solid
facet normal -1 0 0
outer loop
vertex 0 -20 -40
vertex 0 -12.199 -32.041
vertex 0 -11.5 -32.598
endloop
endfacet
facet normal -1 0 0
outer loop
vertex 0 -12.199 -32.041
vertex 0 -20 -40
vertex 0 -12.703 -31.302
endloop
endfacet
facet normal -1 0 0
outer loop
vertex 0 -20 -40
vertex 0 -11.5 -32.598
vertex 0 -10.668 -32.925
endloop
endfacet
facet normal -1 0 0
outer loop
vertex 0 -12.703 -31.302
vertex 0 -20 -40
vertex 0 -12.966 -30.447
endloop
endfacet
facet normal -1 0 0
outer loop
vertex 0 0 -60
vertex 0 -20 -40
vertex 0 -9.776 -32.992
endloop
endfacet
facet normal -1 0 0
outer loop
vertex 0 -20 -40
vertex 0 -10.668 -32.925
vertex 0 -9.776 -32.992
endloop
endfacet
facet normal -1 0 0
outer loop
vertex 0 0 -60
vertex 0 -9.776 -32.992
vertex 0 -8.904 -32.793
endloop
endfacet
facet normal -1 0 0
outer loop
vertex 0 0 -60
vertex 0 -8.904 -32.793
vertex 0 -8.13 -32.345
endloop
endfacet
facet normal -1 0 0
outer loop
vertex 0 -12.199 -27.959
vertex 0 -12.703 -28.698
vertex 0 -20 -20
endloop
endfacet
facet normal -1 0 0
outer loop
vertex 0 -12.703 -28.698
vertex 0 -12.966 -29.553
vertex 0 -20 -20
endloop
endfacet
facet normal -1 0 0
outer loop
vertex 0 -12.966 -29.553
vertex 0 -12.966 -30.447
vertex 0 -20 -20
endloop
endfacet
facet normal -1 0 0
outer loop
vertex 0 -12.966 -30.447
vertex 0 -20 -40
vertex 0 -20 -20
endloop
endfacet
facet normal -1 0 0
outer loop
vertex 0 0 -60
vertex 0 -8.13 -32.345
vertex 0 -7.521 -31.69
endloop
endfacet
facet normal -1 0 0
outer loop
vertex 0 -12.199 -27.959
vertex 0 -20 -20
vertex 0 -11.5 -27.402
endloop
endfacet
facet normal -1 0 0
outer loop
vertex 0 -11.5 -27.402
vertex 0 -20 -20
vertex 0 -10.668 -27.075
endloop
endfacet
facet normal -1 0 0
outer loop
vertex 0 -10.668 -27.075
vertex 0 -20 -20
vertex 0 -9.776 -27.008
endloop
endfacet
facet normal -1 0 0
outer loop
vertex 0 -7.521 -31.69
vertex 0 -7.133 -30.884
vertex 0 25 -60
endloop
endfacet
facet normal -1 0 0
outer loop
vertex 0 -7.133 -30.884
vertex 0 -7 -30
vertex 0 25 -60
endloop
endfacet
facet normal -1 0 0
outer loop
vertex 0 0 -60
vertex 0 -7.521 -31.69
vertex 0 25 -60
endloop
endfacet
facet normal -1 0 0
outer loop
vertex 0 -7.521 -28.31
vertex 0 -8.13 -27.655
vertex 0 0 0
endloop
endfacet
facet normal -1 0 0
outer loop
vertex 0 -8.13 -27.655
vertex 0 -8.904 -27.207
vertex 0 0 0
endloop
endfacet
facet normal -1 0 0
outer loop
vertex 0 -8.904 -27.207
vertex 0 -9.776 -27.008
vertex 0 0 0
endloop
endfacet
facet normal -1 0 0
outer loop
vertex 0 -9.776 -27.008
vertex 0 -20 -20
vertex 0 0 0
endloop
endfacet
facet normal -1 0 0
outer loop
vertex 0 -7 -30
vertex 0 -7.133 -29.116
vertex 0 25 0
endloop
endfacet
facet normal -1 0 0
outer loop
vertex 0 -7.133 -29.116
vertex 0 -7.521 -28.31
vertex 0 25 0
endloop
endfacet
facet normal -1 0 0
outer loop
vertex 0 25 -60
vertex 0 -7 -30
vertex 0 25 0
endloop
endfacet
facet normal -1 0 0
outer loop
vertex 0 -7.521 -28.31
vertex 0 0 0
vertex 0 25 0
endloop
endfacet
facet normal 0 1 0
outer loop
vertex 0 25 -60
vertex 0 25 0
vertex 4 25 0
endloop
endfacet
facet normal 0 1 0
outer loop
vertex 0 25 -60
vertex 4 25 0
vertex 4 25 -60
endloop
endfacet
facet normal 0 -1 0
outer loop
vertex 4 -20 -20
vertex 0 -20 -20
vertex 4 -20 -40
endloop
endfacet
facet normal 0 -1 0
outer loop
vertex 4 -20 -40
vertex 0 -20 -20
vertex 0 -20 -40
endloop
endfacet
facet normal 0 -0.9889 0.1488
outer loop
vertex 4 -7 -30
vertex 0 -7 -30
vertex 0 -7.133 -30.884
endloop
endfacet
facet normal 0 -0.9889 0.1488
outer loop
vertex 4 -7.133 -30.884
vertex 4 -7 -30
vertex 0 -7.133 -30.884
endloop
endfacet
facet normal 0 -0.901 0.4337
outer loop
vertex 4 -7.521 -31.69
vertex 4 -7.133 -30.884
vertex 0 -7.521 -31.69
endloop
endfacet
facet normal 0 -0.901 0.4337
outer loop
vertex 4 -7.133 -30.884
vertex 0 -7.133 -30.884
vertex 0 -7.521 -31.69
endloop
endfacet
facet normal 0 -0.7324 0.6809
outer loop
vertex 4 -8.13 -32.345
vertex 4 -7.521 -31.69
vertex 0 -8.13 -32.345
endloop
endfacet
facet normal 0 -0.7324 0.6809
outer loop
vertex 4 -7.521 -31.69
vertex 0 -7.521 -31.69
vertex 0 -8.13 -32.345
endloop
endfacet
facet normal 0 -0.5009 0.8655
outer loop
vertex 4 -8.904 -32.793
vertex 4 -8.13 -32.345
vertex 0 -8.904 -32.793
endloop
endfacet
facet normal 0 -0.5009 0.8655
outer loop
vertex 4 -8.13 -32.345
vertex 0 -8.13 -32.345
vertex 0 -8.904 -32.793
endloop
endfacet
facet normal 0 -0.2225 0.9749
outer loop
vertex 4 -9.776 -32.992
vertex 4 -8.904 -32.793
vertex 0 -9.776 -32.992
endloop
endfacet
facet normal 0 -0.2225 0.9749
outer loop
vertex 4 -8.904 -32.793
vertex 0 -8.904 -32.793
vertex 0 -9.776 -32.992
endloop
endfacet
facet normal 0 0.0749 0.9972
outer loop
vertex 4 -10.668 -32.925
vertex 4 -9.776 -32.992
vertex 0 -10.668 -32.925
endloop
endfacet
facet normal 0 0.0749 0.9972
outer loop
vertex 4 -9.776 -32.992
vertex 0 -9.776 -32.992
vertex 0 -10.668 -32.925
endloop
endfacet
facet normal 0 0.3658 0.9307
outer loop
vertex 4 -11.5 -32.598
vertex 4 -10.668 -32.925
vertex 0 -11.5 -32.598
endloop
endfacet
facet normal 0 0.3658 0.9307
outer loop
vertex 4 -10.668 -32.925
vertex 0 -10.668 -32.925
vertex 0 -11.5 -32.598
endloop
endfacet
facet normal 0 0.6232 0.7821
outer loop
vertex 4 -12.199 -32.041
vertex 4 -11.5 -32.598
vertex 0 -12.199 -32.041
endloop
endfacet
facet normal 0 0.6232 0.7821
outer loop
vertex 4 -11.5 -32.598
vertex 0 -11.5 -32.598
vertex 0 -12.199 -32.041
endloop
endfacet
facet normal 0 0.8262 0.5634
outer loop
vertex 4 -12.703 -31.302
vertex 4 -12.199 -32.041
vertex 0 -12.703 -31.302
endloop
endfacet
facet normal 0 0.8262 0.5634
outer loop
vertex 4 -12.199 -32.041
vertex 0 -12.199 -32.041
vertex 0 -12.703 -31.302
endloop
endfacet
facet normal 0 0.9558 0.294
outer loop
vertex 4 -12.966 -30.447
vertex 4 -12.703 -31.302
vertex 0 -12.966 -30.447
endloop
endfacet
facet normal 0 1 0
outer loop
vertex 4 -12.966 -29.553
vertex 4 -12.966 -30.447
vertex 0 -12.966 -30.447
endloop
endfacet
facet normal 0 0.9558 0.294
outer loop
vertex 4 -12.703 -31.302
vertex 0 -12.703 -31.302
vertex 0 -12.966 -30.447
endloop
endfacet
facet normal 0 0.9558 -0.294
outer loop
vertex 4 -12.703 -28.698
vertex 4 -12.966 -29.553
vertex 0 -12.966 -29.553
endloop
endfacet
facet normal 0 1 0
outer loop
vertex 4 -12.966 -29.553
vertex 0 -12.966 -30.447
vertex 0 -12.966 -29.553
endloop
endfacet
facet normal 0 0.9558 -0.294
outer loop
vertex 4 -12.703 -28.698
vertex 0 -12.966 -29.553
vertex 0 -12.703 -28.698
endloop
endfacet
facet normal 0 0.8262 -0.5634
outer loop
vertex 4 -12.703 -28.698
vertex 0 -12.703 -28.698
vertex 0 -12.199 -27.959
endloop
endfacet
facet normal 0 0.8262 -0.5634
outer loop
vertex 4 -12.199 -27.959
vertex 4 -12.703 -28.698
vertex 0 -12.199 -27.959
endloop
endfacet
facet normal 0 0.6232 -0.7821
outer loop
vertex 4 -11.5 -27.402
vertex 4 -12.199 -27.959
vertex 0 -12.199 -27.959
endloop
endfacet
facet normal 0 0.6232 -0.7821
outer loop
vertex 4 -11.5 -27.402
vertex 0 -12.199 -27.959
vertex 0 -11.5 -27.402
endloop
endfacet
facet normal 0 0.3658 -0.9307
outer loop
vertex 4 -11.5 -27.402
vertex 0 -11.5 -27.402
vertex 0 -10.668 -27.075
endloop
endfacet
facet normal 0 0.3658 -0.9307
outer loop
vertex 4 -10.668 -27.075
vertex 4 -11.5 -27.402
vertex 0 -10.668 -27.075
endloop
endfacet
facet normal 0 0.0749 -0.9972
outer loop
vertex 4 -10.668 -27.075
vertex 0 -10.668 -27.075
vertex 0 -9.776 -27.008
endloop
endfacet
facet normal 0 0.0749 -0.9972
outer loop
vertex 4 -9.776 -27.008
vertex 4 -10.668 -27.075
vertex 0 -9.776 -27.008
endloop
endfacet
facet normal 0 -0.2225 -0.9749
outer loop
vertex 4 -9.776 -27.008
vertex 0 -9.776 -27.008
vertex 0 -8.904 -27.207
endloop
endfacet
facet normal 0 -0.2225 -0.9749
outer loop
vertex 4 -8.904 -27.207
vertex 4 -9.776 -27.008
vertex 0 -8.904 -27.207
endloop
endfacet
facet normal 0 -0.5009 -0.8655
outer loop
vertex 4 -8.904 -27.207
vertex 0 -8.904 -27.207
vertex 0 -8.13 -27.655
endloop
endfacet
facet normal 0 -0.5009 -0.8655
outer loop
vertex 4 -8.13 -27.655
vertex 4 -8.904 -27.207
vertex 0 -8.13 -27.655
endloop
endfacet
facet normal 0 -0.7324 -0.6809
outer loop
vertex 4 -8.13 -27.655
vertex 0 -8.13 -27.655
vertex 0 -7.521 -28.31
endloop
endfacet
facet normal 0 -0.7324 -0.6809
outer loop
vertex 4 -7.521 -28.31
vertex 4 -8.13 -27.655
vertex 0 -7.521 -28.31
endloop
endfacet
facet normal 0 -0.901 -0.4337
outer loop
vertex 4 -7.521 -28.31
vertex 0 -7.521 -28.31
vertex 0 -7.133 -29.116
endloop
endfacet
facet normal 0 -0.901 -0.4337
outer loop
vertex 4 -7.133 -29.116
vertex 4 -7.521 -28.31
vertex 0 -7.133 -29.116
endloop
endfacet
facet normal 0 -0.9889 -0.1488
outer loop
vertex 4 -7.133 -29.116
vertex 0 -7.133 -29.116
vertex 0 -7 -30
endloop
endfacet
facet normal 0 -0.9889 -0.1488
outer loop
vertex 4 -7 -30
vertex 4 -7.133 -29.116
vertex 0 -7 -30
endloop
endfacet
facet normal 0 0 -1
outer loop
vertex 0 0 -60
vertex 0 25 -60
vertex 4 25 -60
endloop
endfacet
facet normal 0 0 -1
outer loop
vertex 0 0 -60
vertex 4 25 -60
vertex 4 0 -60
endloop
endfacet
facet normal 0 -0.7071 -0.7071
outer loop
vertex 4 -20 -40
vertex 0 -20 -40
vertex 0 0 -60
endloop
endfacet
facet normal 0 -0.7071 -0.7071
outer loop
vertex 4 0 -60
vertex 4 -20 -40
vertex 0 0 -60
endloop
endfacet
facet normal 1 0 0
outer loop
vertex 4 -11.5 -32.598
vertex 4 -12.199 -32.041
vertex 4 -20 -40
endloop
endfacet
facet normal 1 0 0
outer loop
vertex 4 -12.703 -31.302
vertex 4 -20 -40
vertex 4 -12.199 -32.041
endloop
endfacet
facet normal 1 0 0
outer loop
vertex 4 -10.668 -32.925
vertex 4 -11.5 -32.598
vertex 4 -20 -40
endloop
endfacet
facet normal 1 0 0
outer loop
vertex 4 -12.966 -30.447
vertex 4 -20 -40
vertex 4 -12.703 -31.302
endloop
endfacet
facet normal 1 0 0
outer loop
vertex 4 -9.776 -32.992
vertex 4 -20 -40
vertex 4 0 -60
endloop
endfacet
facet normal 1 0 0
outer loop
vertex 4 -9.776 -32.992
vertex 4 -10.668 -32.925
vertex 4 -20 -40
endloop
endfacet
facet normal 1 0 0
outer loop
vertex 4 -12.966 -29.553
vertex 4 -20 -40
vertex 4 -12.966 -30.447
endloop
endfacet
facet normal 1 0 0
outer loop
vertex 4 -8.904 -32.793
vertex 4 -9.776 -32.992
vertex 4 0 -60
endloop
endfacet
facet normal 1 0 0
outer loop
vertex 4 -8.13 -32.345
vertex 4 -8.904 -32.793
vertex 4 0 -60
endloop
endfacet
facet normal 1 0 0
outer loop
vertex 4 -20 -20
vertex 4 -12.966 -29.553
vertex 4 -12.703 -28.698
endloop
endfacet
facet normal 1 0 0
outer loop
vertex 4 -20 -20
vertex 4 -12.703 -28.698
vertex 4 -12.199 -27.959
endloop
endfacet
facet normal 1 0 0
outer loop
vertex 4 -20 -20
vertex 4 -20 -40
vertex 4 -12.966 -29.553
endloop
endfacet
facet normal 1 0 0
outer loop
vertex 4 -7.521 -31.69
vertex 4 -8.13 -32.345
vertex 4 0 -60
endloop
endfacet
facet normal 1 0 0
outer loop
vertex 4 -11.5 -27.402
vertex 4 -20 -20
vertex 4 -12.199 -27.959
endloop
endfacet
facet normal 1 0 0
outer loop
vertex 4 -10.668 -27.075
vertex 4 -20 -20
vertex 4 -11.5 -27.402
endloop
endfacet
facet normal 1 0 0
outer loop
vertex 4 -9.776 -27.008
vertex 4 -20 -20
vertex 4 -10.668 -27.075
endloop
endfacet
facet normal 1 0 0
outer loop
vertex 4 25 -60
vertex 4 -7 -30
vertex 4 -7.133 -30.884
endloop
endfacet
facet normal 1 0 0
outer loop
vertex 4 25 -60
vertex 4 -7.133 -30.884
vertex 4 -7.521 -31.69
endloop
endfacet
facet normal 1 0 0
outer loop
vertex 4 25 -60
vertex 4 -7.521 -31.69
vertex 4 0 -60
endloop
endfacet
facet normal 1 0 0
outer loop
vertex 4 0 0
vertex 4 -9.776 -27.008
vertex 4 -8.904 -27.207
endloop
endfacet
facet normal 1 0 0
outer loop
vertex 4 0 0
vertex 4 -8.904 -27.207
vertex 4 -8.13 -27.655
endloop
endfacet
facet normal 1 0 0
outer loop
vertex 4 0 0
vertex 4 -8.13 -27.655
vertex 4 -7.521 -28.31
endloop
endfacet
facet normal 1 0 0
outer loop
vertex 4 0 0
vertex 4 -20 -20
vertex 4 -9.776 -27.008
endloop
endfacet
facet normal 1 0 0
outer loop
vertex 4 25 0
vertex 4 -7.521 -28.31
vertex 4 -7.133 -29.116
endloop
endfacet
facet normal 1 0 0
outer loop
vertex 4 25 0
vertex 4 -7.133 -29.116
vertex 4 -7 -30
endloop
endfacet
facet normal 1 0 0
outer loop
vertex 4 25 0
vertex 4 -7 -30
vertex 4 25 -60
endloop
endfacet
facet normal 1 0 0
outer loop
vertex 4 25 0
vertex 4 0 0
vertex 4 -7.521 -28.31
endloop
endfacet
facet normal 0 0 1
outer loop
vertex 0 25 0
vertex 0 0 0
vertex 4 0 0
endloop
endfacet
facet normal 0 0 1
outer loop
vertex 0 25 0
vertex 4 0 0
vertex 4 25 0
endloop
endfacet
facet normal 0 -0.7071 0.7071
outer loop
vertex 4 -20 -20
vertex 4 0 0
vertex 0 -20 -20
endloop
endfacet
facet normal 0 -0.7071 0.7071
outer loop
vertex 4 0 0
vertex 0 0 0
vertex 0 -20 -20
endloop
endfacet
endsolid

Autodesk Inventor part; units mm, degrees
sketch "Sketch1" plane through (0, 0, 0) normal (1, 0, 0) x (0, 1, 0)
  line L0 (0, 0) -> (25, 0)
  line L1 (25, 0) -> (25, -60)
  line L2 (25, -60) -> (0, -60)
  line L3 (0, -60) -> (0, 0)
  line L4 (0, -20) -> (-20, -20)
  line L5 (-20, -20) -> (-20, -40)
  line L6 (-20, -40) -> (0, -40)
  line L7 (0, -40) -> (0, -20)
  line L8 (0, 0) -> (-20, -20)
  line L9 (-20, -40) -> (0, -60)
  line L10 (0, -30) -> (-20, -30)
  circle A0 centre (-10, -30) radius 3
  dimension "d0" = 25
  dimension "d1" = 60
  dimension "d2" = 20
  dimension "d3" = 20
  dimension "d4" = 6
extrude "Extrusion1" add sketch "Sketch1" along normal blind 4 contours L0 L1 L2 L3 | L3 L4 L8 | L3 L10 A0 L5 L4 | L3 L6 L5 L10 A0 | L9 L6 L3
properties part number "stickplate"
